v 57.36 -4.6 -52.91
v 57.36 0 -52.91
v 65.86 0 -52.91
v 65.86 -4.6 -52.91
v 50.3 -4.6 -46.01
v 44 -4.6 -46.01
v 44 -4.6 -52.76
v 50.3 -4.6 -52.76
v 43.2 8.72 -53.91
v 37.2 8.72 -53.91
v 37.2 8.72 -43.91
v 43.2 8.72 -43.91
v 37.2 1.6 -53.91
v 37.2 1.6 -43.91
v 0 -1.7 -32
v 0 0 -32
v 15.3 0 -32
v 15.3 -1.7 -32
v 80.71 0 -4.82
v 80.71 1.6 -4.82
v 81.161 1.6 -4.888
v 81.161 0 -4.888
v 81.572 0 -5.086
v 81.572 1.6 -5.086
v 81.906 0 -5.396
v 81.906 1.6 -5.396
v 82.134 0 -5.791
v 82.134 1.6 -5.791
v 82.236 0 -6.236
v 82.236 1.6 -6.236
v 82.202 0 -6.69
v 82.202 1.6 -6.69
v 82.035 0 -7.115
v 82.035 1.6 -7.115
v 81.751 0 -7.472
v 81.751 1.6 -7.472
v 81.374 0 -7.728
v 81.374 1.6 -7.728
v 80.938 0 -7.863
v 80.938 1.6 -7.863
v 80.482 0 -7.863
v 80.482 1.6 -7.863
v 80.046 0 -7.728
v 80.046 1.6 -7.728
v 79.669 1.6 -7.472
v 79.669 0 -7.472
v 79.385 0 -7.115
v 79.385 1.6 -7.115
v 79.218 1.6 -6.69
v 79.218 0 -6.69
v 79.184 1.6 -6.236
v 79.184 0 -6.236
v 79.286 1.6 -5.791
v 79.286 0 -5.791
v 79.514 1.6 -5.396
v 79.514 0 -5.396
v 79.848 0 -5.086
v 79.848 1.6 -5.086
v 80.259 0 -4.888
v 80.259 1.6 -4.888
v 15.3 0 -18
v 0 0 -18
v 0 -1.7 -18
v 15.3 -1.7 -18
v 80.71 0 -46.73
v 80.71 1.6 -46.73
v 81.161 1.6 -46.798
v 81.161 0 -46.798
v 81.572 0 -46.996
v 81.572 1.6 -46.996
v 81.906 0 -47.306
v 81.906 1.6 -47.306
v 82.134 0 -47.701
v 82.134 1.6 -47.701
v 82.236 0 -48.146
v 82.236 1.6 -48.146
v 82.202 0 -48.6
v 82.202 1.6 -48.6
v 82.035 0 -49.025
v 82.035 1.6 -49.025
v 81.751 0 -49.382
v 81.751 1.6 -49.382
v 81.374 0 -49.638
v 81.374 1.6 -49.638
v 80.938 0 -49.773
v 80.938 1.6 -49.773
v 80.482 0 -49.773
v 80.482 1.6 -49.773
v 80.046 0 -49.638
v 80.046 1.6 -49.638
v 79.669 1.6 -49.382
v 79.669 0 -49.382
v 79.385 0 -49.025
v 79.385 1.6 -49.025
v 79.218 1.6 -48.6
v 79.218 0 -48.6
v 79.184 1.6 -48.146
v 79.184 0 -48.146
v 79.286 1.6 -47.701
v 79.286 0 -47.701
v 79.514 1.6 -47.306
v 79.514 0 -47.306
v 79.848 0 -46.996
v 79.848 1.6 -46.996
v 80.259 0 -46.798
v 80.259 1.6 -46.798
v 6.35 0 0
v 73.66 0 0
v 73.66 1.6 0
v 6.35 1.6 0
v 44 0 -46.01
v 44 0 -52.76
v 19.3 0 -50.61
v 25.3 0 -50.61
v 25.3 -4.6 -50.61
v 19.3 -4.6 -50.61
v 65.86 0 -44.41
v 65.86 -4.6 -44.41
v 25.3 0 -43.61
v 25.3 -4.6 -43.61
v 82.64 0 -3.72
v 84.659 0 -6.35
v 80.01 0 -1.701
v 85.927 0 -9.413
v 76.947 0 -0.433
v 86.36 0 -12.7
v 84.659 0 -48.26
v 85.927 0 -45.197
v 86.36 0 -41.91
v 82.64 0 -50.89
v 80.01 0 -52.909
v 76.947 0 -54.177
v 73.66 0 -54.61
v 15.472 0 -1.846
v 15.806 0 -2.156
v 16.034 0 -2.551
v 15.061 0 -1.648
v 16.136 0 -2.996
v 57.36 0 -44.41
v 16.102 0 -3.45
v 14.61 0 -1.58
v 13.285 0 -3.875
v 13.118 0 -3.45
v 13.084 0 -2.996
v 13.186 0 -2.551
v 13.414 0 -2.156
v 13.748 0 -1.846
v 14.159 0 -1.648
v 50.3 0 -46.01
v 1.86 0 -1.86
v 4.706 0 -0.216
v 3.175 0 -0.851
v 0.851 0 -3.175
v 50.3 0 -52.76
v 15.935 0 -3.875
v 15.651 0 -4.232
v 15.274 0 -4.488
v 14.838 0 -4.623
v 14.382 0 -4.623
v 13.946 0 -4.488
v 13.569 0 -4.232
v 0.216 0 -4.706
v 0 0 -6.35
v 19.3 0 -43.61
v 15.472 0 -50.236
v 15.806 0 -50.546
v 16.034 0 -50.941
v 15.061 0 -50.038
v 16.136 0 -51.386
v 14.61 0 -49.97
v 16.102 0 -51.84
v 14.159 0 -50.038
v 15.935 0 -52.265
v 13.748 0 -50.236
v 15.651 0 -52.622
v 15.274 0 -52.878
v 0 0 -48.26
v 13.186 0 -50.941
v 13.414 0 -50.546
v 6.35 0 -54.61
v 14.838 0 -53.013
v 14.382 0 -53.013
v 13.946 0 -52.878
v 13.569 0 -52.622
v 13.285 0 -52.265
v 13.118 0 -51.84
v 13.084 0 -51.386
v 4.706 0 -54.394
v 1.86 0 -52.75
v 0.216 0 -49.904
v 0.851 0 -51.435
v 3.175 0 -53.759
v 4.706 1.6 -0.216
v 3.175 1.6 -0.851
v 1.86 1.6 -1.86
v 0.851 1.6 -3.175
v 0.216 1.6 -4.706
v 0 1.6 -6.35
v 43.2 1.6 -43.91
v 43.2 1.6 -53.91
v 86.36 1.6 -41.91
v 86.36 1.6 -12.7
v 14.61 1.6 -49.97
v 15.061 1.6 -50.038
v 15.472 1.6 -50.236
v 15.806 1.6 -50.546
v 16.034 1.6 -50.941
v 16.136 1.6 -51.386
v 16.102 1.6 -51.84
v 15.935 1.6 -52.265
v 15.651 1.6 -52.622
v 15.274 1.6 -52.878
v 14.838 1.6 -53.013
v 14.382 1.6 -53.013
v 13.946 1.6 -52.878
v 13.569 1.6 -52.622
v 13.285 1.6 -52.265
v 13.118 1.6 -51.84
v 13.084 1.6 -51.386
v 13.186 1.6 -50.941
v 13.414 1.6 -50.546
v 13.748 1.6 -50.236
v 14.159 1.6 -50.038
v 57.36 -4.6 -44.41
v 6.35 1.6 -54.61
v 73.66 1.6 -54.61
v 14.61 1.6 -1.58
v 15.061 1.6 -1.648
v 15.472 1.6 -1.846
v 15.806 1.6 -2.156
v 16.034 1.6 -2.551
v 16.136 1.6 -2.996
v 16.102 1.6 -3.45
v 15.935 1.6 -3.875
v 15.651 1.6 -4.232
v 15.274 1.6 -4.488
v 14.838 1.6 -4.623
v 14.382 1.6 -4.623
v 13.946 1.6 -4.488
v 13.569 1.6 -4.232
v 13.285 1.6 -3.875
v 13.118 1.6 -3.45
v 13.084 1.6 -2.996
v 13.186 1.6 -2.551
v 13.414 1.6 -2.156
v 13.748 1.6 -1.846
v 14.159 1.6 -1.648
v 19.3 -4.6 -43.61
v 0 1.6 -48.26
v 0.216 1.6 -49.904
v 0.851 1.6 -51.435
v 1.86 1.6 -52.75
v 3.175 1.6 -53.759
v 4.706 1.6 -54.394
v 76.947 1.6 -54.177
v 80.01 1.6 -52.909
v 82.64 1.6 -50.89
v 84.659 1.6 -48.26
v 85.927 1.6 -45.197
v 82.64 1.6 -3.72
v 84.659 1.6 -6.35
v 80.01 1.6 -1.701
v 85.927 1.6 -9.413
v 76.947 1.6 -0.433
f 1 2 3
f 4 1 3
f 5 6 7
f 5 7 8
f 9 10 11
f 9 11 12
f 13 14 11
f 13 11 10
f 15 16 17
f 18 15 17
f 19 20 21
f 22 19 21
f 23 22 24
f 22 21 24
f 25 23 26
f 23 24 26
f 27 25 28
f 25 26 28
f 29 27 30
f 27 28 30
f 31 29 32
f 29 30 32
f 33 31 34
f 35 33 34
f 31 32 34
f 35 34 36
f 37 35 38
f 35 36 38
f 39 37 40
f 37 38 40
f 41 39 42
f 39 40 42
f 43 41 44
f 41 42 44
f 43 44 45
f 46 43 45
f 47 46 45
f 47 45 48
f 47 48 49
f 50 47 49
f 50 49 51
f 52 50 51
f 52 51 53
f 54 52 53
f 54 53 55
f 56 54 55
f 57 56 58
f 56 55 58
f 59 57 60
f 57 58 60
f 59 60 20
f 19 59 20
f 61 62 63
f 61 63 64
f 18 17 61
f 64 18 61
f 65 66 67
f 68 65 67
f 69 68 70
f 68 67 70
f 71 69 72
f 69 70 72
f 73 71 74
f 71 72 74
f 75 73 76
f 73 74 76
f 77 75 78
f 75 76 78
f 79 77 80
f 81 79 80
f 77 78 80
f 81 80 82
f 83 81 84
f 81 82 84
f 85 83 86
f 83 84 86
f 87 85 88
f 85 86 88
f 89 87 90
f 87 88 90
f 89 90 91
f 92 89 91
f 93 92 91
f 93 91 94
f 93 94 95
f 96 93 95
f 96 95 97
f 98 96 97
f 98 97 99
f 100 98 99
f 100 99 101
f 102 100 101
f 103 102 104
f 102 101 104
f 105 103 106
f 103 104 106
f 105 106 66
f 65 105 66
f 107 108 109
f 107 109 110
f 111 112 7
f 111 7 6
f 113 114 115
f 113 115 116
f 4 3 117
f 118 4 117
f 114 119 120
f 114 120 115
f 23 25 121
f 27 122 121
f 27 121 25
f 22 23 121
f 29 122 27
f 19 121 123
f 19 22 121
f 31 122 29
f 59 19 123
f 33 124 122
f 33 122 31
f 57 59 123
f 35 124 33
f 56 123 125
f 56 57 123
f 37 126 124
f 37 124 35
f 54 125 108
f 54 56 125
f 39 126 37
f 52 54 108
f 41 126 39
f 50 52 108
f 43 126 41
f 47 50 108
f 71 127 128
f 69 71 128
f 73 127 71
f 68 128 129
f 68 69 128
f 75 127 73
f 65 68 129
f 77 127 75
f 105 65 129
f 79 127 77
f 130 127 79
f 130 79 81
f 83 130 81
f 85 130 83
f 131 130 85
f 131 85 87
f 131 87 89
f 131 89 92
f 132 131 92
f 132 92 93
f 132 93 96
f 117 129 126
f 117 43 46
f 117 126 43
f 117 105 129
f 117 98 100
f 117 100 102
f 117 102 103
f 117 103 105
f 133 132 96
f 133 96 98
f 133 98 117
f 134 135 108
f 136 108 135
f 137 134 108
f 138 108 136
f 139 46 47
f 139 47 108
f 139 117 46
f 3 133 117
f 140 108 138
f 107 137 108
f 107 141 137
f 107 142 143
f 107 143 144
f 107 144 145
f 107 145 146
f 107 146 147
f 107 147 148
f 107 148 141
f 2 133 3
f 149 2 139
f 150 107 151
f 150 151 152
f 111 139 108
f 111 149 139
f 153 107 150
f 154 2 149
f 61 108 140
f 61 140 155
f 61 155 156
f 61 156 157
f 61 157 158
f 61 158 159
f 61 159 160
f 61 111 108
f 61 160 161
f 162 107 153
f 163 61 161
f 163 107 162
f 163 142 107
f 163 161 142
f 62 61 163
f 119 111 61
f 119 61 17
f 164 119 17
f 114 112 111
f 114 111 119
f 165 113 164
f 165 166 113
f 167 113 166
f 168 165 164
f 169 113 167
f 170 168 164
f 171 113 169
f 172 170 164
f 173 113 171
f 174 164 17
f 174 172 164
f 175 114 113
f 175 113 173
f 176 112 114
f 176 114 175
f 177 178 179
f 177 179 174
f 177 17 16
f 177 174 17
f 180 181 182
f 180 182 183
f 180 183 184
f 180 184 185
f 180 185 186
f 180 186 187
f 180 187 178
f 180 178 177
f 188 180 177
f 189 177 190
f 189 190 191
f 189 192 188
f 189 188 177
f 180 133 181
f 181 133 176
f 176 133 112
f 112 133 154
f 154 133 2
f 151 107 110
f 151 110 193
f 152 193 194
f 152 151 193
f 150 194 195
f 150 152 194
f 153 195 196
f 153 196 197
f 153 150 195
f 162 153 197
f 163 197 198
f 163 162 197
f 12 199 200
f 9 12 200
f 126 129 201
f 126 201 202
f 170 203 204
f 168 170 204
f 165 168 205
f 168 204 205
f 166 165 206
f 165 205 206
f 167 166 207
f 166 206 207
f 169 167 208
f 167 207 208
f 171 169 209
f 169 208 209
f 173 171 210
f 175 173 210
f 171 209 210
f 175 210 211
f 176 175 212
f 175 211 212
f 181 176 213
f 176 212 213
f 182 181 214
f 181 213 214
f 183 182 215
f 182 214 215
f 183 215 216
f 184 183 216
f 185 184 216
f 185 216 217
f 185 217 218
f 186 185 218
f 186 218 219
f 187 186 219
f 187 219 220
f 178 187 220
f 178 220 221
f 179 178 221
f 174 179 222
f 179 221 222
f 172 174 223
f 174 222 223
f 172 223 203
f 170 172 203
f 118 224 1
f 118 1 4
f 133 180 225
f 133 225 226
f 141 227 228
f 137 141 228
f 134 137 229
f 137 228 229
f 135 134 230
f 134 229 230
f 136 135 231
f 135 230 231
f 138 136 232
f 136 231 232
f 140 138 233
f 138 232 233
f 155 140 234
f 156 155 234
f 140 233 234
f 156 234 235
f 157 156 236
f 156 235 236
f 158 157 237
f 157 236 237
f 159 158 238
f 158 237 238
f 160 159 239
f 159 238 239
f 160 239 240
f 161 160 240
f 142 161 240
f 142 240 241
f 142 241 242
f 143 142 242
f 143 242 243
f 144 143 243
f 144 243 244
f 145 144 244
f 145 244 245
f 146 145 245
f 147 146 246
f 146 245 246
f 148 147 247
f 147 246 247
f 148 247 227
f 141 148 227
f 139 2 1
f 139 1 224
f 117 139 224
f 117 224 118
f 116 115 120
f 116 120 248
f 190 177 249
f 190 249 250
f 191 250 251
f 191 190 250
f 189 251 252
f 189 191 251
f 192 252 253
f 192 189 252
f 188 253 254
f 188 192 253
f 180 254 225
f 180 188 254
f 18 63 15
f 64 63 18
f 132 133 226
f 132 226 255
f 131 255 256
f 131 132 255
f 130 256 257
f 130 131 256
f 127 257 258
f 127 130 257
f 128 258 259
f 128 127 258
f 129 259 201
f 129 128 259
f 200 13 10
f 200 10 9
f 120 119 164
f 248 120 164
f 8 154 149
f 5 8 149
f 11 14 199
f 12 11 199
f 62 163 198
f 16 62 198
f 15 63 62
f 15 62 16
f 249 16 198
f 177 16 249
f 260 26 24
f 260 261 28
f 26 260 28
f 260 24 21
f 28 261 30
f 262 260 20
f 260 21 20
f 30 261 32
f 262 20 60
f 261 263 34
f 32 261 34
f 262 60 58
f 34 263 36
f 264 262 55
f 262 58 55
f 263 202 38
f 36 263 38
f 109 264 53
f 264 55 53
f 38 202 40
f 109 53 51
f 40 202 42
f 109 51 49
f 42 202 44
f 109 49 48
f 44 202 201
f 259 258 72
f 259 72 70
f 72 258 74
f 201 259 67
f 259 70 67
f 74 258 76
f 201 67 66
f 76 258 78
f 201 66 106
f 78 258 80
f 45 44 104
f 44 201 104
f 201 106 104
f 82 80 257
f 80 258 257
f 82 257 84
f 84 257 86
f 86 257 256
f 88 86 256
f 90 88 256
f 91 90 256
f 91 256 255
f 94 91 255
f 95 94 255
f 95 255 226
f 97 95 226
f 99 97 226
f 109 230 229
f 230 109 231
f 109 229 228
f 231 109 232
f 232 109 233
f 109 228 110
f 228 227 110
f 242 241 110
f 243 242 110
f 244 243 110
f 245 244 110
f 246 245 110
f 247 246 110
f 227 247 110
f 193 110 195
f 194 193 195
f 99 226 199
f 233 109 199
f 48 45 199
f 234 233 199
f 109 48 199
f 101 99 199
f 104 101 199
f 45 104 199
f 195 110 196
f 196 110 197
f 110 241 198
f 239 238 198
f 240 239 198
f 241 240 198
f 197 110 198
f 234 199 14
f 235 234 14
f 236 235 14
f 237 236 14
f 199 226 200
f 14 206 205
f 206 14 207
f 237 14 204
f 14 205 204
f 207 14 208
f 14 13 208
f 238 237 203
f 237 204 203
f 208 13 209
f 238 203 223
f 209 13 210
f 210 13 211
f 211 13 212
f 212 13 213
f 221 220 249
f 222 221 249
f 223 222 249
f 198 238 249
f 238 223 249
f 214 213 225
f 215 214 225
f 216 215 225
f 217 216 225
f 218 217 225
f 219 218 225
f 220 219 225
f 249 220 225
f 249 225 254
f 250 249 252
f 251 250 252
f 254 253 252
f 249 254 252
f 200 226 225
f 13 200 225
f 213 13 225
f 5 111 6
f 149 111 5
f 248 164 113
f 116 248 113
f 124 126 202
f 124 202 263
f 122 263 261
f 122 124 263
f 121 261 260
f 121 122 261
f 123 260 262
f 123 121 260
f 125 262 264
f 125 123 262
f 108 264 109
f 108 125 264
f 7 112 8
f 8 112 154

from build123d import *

# Parameters (mm, degrees)
BOSS_EXTRUDE1_DEPTH = 1.6
SKETCH3_R           = 1.53
CUT_EXTRUDE1_DEPTH  = 1.6
SKETCH4_W           = 6
SKETCH4_H           = 10
BOSS_EXTRUDE2_DEPTH = 7.12
SKETCH5_W           = 15.3
SKETCH5_H           = 14
BOSS_EXTRUDE3_DEPTH = 1.7
SKETCH6_W           = 6
SKETCH6_H           = 7
BOSS_EXTRUDE4_DEPTH = 4.6
SKETCH7_W           = 6.3
SKETCH7_H           = 6.75
BOSS_EXTRUDE5_DEPTH = 4.6
SKETCH8_W           = 8.5
SKETCH8_H           = 8.5
BOSS_EXTRUDE6_DEPTH = 4.6


with BuildPart() as part:
    # Sketch1 → Boss-Extrude1 (new body)
    with BuildSketch(Plane(origin=(0, 0, 0), x_dir=(1, 0, 0), z_dir=(0, 1, 0))):
        with BuildLine():
            Line((6.35, 54.61), (73.66, 54.61))
            ThreePointArc((73.66, 54.61), (82.640256121, 50.890256121), (86.36, 41.91))
            Line((86.36, 41.91), (86.36, 12.7))
            ThreePointArc((86.36, 12.7), (82.640256121, 3.719743879), (73.66, 0))
            Line((73.66, 0), (6.35, 0))
            ThreePointArc((6.35, 0), (1.859871939, 1.859871939), (0, 6.35))
            Line((0, 6.35), (0, 48.26))
            ThreePointArc((0, 48.26), (1.859871939, 52.750128061), (6.35, 54.61))
        make_face()
    extrude(amount=BOSS_EXTRUDE1_DEPTH)

    # Sketch3 → Cut-Extrude1 (cut)
    with BuildSketch(Plane(origin=(0, 1.6, 0), x_dir=(1, 0, 0), z_dir=(0, 1, 0))):
        with Locations(Location((80.71, 6.35, 0), (0, 0, 270))):
            Circle(SKETCH3_R)
        with Locations(Location((14.61, 3.11, 0), (0, 0, 270))):
            Circle(SKETCH3_R)
        with Locations(Location((14.61, 51.5, 0), (0, 0, 270))):
            Circle(SKETCH3_R)
        with Locations(Location((80.71, 48.26, 0), (0, 0, 270))):
            Circle(SKETCH3_R)
    extrude(amount=-CUT_EXTRUDE1_DEPTH, mode=Mode.SUBTRACT)

    # Sketch4 → Boss-Extrude2 (add)
    with BuildSketch(Plane(origin=(0, 1.6, 0), x_dir=(1, 0, 0), z_dir=(0, 1, 0))):
        with Locations((40.2, 48.91)):
            Rectangle(SKETCH4_W, SKETCH4_H)
    extrude(amount=BOSS_EXTRUDE2_DEPTH)

    # Sketch5 → Boss-Extrude3 (add)
    with BuildSketch(Plane.XZ):
        with Locations((7.65, -25)):
            Rectangle(SKETCH5_W, SKETCH5_H)
    extrude(amount=BOSS_EXTRUDE3_DEPTH)

    # Sketch6 → Boss-Extrude4 (add)
    with BuildSketch(Plane(origin=(0, 0, 0), x_dir=(-1, 0, 0), z_dir=(0, -1, 0))):
        with Locations((-22.3, 47.11)):
            Rectangle(SKETCH6_W, SKETCH6_H)
    extrude(amount=BOSS_EXTRUDE4_DEPTH)

    # Sketch7 → Boss-Extrude5 (add)
    with BuildSketch(Plane.XZ):
        with Locations((47.15, -49.385)):
            Rectangle(SKETCH7_W, SKETCH7_H)
    extrude(amount=BOSS_EXTRUDE5_DEPTH)

    # Sketch8 → Boss-Extrude6 (add)
    with BuildSketch(Plane.XZ):
        with Locations((61.61, -48.66)):
            Rectangle(SKETCH8_W, SKETCH8_H)
    extrude(amount=BOSS_EXTRUDE6_DEPTH)


solid = part.part
